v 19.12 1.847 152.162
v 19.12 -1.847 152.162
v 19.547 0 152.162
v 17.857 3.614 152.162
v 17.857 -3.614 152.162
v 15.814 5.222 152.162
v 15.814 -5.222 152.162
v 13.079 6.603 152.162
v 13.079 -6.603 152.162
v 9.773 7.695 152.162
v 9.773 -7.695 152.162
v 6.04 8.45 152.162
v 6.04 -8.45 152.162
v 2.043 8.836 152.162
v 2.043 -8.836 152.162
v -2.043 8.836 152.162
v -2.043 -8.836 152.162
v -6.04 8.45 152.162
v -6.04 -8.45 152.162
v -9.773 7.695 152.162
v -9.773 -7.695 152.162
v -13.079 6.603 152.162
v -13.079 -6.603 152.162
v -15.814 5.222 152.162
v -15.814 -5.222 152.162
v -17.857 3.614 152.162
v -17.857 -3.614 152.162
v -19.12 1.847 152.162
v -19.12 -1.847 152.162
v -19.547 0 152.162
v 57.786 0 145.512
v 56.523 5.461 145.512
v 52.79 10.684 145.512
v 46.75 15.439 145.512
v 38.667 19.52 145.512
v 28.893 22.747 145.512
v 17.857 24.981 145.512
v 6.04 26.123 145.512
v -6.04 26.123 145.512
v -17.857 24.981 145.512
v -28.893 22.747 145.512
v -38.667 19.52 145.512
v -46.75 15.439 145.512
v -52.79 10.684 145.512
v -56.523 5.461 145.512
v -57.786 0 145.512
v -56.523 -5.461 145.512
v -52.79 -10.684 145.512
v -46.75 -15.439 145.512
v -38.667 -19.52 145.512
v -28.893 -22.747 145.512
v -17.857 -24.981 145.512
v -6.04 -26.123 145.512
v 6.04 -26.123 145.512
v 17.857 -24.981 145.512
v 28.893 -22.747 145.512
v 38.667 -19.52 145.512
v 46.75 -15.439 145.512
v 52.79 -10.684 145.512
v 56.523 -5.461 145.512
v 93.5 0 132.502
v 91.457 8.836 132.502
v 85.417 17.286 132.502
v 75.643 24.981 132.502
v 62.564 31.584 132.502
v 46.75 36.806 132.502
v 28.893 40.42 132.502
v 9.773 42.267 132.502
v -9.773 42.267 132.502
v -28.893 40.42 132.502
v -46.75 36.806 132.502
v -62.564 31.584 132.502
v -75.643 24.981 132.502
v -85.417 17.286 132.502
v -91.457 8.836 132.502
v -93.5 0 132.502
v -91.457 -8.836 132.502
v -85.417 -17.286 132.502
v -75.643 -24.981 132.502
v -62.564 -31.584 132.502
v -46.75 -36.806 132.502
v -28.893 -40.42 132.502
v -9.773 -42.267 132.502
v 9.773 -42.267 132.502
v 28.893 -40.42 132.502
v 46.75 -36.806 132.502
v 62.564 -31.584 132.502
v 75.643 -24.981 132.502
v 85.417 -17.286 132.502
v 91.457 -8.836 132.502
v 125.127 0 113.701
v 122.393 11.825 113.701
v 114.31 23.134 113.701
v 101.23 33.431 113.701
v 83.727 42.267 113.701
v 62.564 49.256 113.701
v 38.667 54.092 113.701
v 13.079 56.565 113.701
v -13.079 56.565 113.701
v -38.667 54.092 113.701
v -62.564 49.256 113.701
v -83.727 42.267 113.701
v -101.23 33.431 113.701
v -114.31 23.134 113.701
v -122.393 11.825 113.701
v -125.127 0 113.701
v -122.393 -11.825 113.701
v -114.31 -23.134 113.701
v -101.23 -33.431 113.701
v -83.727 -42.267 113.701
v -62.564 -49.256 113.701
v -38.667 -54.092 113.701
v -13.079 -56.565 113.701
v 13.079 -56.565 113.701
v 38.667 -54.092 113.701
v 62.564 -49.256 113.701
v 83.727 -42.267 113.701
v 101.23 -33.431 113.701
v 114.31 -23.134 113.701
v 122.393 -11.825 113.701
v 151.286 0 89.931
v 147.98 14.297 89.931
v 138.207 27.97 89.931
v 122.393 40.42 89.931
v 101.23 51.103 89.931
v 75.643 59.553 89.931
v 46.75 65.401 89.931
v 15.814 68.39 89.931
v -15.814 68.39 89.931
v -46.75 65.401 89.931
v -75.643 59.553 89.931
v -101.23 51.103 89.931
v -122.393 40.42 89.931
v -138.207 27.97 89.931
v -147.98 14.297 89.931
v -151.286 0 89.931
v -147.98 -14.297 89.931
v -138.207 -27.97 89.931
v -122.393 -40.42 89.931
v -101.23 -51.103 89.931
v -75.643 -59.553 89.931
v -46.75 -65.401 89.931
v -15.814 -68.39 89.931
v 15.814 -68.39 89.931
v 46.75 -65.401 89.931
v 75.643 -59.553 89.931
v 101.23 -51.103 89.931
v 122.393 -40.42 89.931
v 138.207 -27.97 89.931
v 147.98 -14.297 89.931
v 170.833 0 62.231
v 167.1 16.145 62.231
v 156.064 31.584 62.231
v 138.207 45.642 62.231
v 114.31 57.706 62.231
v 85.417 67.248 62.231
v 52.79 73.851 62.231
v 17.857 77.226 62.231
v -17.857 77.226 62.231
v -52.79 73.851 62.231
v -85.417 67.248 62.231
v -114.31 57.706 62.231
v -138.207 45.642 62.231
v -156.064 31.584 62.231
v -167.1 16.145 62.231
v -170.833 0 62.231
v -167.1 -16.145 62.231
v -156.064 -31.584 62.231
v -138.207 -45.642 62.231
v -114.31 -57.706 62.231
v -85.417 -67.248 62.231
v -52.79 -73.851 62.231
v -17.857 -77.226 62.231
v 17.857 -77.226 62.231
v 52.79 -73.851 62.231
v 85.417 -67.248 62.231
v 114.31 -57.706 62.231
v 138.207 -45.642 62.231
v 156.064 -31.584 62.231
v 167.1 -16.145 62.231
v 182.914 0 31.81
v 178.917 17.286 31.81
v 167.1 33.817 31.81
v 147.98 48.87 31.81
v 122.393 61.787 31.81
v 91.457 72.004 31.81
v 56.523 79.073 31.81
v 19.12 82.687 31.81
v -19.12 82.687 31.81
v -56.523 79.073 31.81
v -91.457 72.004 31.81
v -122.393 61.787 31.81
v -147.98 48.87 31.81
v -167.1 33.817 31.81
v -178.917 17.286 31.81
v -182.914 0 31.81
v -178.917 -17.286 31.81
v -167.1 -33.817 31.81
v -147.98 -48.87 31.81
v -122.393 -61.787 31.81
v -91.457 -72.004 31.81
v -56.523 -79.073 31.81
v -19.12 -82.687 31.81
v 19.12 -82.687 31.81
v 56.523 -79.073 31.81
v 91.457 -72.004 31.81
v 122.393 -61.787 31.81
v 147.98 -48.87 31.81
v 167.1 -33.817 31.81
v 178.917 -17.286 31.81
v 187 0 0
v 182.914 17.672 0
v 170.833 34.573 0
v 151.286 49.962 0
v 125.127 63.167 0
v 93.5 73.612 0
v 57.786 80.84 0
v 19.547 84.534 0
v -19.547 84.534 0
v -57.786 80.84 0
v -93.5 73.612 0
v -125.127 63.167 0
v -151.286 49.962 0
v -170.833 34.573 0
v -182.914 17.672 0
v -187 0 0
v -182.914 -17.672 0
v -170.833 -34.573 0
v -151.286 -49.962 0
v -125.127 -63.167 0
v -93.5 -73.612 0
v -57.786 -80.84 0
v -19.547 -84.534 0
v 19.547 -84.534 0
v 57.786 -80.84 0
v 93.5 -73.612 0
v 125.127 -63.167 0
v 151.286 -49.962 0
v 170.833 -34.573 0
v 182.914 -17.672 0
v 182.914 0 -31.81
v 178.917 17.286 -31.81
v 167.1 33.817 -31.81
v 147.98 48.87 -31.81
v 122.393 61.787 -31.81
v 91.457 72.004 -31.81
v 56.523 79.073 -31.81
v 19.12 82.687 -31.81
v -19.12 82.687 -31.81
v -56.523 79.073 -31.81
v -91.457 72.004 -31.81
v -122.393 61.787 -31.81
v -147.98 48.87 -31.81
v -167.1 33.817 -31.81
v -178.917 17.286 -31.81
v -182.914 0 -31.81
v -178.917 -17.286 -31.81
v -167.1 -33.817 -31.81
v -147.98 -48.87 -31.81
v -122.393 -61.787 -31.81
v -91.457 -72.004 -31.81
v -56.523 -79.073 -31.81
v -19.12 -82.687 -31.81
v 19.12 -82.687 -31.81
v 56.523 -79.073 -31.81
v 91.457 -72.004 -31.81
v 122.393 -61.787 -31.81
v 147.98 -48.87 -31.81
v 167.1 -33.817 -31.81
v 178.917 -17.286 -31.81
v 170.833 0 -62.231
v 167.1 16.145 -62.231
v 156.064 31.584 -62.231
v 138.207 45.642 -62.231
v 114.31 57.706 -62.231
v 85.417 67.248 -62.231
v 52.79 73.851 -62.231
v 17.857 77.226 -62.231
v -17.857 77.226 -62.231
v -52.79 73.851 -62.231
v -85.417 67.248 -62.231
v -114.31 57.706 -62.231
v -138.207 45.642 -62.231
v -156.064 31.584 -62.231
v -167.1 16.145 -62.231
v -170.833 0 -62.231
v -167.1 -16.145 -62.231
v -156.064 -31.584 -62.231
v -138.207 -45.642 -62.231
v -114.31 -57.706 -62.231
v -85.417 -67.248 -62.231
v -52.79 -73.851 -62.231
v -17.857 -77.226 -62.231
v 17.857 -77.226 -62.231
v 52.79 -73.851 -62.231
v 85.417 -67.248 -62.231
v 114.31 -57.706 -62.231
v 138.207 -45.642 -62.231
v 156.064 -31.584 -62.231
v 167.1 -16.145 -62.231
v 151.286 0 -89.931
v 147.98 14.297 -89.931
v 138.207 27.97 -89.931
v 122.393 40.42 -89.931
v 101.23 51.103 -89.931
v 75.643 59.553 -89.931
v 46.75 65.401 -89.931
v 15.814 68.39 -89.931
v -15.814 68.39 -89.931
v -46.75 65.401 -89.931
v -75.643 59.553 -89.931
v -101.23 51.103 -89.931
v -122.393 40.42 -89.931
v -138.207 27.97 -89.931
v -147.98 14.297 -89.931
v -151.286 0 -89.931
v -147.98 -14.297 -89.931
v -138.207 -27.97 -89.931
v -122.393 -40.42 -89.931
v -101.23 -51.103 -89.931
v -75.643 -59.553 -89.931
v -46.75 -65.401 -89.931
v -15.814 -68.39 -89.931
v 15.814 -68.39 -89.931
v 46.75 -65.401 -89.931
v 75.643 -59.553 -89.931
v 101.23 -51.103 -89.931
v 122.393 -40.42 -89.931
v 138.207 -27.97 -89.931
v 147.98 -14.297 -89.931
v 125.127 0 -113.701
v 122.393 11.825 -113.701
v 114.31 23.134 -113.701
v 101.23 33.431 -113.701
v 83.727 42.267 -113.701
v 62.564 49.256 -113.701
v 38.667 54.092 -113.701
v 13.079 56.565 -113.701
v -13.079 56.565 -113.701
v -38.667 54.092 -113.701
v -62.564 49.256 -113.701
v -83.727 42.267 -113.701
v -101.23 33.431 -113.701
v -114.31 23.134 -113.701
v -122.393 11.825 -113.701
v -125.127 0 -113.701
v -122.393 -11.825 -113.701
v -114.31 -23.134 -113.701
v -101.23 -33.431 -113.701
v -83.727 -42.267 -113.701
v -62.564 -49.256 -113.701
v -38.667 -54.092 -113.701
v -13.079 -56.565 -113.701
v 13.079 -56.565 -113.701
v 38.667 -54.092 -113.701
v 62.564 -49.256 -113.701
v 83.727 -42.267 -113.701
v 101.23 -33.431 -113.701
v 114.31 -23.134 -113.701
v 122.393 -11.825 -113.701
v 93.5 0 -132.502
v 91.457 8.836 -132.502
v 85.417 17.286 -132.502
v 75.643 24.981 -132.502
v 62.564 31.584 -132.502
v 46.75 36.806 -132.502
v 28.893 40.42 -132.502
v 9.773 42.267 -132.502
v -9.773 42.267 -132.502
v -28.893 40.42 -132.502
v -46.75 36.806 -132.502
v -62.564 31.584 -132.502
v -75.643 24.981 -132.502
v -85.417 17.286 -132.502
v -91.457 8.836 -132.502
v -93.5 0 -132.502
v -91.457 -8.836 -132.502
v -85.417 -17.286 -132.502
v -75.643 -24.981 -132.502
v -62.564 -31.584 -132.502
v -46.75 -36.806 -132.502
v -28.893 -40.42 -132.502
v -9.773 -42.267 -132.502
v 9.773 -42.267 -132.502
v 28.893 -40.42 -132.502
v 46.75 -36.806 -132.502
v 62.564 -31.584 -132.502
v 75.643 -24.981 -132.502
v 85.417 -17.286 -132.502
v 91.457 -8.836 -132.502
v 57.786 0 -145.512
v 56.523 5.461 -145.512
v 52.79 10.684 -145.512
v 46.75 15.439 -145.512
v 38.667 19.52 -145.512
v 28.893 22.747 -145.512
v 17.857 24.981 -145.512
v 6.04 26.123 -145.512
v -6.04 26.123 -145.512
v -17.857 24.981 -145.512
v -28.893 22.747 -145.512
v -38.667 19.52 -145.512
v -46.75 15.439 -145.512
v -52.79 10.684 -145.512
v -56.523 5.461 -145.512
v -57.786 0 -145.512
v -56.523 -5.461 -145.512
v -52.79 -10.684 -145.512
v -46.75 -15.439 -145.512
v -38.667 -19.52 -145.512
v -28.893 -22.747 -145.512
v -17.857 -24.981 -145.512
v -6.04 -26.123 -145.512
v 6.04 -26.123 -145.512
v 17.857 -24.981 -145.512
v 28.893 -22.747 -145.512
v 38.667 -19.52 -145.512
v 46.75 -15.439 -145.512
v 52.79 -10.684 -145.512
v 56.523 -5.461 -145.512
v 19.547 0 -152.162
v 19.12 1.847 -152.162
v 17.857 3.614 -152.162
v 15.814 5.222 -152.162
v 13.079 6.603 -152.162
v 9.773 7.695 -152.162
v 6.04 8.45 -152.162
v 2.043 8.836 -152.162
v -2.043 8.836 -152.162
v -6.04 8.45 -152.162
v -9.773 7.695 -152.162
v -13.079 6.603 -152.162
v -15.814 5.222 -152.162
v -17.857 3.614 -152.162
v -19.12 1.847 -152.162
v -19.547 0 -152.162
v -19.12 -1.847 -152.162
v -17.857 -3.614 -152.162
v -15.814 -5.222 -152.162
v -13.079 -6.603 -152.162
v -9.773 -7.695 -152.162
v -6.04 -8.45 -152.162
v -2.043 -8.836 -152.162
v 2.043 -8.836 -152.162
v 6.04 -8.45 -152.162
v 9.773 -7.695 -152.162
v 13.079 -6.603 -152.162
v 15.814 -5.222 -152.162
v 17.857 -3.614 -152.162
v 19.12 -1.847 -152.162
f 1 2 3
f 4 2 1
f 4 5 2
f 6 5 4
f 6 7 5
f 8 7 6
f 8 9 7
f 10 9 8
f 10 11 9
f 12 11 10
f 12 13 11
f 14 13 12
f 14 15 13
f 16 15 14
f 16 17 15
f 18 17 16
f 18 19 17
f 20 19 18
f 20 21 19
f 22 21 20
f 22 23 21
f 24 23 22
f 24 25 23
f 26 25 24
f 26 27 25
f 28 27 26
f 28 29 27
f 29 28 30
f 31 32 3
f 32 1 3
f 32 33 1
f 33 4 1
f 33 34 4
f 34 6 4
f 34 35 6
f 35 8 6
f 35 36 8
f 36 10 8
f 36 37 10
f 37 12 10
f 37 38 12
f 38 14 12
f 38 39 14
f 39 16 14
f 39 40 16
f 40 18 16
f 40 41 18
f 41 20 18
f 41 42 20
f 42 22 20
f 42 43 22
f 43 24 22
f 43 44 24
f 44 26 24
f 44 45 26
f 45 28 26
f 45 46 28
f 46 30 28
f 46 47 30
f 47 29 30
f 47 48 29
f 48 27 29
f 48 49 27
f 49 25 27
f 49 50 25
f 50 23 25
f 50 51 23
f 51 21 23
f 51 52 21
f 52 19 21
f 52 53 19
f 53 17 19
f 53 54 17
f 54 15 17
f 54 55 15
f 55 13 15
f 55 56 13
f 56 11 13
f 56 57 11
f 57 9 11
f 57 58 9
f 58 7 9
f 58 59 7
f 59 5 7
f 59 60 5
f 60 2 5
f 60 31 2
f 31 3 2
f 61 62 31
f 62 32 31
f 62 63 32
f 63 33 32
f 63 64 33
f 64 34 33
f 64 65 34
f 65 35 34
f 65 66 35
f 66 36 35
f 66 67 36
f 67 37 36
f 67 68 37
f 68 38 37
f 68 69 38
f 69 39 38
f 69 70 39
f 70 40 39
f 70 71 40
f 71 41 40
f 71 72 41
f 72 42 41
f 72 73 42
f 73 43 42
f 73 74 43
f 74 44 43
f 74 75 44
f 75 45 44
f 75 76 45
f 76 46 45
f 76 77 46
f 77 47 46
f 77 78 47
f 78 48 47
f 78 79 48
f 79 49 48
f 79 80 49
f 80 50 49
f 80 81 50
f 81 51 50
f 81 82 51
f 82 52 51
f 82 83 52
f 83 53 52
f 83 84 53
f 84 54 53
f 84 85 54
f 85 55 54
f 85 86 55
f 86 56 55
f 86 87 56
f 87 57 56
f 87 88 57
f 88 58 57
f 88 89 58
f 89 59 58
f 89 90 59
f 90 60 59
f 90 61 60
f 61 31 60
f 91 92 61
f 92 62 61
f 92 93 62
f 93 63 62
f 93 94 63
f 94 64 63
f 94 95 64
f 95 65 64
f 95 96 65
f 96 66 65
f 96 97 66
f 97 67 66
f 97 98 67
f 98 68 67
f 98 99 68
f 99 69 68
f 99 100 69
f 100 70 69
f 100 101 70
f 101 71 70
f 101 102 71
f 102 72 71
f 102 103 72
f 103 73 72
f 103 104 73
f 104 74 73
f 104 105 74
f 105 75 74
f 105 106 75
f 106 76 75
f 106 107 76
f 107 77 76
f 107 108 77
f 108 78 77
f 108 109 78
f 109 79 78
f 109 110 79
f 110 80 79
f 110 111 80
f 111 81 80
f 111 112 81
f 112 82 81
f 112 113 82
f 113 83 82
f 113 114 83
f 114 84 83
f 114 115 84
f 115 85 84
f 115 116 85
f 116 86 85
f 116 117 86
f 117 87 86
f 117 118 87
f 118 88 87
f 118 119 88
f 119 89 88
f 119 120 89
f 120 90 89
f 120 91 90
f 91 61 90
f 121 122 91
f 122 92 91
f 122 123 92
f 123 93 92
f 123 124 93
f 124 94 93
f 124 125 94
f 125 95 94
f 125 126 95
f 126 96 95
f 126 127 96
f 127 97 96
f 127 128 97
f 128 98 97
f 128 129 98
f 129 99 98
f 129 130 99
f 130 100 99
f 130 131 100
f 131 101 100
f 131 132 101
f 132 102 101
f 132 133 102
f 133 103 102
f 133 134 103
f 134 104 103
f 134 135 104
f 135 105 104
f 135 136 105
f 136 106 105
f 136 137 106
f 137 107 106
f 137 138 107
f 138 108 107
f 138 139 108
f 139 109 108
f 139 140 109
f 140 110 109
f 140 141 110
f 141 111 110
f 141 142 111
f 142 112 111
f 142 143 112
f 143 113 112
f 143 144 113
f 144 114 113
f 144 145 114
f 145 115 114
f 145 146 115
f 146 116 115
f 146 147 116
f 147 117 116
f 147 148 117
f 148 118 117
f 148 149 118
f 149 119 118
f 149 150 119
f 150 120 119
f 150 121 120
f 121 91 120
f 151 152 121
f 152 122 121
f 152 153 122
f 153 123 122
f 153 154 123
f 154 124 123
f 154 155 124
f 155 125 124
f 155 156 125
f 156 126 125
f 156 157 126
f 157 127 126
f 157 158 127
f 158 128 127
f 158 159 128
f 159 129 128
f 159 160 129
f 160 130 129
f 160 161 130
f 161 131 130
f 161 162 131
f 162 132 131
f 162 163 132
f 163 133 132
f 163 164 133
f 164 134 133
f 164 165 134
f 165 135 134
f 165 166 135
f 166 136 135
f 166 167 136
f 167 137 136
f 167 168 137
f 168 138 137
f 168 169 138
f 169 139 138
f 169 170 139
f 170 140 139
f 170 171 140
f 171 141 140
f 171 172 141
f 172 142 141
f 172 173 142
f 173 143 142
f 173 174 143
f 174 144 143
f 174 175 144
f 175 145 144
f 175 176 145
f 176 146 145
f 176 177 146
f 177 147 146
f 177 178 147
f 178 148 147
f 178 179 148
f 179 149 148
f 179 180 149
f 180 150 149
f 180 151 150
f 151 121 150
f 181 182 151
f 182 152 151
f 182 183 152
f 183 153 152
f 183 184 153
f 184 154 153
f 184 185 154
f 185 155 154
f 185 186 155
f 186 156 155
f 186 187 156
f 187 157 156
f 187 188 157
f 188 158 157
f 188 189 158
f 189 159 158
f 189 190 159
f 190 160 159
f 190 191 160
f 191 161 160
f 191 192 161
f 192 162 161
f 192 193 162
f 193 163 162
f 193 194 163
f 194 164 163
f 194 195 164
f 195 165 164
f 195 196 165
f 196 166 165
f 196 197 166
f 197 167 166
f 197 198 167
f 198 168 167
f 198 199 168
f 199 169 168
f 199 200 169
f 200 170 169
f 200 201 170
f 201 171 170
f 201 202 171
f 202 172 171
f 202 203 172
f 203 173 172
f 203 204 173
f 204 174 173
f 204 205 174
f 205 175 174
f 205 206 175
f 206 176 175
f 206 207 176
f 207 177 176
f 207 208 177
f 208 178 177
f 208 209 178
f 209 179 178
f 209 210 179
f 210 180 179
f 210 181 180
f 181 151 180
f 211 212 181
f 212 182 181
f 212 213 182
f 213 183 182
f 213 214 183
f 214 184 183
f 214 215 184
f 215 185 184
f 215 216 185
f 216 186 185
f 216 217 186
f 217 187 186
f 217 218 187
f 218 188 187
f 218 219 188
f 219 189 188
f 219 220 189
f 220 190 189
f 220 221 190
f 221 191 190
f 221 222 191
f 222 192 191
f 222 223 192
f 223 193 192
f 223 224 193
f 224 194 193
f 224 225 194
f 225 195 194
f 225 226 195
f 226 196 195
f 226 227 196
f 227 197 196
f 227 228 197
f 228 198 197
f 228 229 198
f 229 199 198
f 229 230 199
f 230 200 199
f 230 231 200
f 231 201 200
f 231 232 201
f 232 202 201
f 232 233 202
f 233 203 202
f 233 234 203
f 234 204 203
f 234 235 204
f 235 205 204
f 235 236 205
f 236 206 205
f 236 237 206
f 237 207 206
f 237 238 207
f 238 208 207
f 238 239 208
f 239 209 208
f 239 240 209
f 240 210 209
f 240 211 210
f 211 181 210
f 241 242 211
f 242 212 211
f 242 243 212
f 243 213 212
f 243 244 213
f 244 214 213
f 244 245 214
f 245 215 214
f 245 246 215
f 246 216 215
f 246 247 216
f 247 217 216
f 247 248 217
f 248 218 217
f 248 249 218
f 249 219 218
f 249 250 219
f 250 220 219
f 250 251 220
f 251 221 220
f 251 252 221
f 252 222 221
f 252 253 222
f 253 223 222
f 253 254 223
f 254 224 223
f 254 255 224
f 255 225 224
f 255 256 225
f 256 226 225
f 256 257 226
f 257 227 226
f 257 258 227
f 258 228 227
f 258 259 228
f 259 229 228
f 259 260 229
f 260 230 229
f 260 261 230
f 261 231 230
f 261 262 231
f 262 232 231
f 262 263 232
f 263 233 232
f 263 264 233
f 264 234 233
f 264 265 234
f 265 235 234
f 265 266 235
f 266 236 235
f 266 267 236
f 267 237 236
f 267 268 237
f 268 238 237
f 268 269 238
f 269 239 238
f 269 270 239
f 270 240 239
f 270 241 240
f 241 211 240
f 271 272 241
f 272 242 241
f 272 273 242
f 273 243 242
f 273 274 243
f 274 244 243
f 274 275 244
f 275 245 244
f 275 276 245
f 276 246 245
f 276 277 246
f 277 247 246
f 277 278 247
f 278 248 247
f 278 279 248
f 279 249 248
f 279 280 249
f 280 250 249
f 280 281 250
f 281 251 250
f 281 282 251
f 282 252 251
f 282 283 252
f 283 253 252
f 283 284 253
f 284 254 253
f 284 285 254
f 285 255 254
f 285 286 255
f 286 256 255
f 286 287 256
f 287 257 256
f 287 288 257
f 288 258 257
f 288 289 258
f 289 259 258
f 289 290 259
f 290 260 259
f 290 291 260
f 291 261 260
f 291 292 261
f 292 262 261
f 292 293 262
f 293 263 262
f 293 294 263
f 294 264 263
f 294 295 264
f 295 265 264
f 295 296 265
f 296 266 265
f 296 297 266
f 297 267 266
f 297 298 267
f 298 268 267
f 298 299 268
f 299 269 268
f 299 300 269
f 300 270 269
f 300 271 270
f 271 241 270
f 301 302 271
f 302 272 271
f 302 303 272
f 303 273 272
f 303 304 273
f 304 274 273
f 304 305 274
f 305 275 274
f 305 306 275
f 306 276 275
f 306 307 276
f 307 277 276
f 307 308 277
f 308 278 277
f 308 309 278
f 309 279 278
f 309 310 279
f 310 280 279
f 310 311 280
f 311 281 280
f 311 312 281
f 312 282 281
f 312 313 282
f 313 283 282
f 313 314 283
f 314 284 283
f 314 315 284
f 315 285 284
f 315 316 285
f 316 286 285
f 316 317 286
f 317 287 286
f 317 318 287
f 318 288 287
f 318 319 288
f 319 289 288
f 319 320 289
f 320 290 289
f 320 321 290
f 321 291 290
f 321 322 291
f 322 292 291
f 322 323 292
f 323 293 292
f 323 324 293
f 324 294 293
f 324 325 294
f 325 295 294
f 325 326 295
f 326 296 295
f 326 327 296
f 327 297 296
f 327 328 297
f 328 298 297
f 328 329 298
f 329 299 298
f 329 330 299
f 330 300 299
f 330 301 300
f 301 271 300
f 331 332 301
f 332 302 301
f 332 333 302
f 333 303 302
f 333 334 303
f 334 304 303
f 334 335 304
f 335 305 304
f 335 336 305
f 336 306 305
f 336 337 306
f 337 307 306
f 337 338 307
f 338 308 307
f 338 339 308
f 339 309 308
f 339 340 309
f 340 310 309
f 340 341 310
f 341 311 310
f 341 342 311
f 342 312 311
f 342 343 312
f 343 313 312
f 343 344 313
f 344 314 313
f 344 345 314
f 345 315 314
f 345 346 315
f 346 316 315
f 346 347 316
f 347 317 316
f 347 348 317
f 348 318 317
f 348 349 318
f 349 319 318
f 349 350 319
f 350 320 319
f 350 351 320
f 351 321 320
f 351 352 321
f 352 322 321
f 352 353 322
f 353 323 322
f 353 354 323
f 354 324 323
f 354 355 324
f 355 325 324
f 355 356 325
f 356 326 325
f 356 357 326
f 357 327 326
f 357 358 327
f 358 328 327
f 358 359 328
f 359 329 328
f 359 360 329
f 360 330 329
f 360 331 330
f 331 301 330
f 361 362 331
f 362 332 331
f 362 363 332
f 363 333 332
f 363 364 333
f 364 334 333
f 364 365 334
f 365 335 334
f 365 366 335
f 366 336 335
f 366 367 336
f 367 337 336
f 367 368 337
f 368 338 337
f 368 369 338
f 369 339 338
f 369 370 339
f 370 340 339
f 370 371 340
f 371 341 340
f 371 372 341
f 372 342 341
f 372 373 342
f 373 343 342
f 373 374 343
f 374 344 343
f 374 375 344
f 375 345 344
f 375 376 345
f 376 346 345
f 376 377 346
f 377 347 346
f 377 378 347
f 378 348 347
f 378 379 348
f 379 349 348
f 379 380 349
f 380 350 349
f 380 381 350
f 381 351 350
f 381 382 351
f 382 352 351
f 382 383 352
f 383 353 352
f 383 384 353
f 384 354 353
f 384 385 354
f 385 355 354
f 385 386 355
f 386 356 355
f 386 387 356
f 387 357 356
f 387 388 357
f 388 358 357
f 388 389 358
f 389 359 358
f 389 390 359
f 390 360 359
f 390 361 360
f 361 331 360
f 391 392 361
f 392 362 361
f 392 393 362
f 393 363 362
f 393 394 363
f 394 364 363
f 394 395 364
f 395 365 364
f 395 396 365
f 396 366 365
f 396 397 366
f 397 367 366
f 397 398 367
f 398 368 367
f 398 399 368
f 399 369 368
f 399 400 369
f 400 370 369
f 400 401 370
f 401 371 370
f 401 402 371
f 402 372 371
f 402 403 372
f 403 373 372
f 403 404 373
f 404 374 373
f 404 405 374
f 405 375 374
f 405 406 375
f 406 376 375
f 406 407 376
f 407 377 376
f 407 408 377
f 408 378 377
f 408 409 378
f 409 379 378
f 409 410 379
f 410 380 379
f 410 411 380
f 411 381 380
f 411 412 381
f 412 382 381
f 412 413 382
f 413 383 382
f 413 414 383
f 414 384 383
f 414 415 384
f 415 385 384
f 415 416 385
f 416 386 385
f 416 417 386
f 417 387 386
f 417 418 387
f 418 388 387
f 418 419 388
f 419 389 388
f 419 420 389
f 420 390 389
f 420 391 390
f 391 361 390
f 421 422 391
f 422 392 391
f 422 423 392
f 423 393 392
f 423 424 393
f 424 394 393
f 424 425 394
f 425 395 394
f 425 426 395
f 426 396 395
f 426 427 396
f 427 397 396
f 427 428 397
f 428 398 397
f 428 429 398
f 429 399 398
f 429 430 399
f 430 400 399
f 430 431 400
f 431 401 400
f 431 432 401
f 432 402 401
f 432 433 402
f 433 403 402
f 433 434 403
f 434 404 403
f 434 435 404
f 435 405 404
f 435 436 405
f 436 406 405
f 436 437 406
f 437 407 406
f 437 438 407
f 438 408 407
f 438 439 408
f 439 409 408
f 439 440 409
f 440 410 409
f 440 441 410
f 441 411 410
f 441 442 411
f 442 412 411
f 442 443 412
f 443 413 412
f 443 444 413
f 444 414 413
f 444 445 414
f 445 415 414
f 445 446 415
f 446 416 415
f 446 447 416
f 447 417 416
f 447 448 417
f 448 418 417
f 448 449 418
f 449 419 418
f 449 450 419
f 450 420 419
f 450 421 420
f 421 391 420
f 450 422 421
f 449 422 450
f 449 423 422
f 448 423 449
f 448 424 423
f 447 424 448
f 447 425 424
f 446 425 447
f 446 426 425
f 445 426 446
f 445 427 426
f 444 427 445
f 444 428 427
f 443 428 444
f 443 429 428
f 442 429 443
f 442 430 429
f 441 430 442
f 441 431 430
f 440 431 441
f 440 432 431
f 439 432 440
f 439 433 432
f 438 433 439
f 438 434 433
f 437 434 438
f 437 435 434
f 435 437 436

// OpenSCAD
// Generated by SolidPython 1.0.1 on 2020-07-29 00:46:49


scale(v = [11, 5, 9]) {
	sphere(r = 17);
}
/***********************************************
*********      SolidPython code:      **********
************************************************
 
# import packages: SolidPython
from solid import *
from solid.utils import *
from itertools import chain, combinations, permutations


class Resize:

    def __init__(self, scad_file):
        self.scad_file = scad_file
        #self.scad_file = import_scad(scad_file)
        # cone/cylinder param:
        self.r1 = 0
        self.r2 = 0
        self.h = 0
        # rectangular prism param:
        self.w = 0
        self.l = 0
        # ellipse param:
        self.r = 0

    # import OpenScad code (file name corresponds to shape)


    # classify shape + parameters
    def assign(self, param1, param2, param3):
        if self.scad_file == 'cone.scad':
            self.r1 = param1
            self.r2 = param2
            self.h = param3
        elif self.scad_file == 'cylinder.scad':
            self.r1 = param1
            self.r2 = param2
            self.h = param3
        elif self.scad_file == 'rectangularPrism.scad':
            self.h = param1
            self.l = param2
            self.w = param3
        else:
            self.r = param1
            self.h = param2

    # resize parameters
    def iterate(self):
        x = range(3, 20, 2)
        i = 1
        if self.scad_file == 'cone.scad':
            tempList = list(permutations(x, 2))
            for temp in tempList:
                param1 = temp[0]
                param2 = temp[1]
                filepath = 'produced_scad_files/' + 'cone' + str(param1) + '_' + str(param2) + '_' + '.scad'
                scad_render_to_file(cylinder(h=param1, r1=param2, r2=0), filepath)

        elif self.scad_file == 'cylinder.scad':
            tempList = list(permutations(x, 3))
            for temp in tempList:
                param1 = temp[0]
                param2 = temp[1]
                filepath = 'produced_scad_files/' + 'cylinder' + str(param1) + '_' + str(param2) + '_' + '.scad'
                scad_render_to_file(cylinder(h=param1, r1=param2, r2=param2), filepath)

        elif self.scad_file == 'rectangularPrism.scad':
            tempList = list(permutations(x, 3))
            for temp in tempList:
                param1 = temp[0]
                param2 = temp[1]
                param3 = temp[2]
                filepath = 'produced_scad_files/' + 'rectangularPrism' + str(param1) + '_' + str(param2) + '_' + str(
                    param3) + '.scad'
                scad_render_to_file(cube(size=(param1, param2, param3)), filepath)

        elif self.scad_file == 'ellipse.scad':
            tempList = list(permutations(x, 4))
            for temp in tempList:
                param1 = temp[0]
                param2 = temp[1]
                param3 = temp[2]
                param4 = temp[3]
                filepath = 'produced_scad_files/' + 'ellipse' + str(param1) + '_' + str(param2) + '_' + str(param3) + '_' + str(param4) + '.scad'
                scad_render_to_file(scale([param1, param2, param3])(sphere(r=param4)), filepath)

    def render_to_scadfile(self):
        scad_render_to_file(scad, 'example.scad') 
 
************************************************/
